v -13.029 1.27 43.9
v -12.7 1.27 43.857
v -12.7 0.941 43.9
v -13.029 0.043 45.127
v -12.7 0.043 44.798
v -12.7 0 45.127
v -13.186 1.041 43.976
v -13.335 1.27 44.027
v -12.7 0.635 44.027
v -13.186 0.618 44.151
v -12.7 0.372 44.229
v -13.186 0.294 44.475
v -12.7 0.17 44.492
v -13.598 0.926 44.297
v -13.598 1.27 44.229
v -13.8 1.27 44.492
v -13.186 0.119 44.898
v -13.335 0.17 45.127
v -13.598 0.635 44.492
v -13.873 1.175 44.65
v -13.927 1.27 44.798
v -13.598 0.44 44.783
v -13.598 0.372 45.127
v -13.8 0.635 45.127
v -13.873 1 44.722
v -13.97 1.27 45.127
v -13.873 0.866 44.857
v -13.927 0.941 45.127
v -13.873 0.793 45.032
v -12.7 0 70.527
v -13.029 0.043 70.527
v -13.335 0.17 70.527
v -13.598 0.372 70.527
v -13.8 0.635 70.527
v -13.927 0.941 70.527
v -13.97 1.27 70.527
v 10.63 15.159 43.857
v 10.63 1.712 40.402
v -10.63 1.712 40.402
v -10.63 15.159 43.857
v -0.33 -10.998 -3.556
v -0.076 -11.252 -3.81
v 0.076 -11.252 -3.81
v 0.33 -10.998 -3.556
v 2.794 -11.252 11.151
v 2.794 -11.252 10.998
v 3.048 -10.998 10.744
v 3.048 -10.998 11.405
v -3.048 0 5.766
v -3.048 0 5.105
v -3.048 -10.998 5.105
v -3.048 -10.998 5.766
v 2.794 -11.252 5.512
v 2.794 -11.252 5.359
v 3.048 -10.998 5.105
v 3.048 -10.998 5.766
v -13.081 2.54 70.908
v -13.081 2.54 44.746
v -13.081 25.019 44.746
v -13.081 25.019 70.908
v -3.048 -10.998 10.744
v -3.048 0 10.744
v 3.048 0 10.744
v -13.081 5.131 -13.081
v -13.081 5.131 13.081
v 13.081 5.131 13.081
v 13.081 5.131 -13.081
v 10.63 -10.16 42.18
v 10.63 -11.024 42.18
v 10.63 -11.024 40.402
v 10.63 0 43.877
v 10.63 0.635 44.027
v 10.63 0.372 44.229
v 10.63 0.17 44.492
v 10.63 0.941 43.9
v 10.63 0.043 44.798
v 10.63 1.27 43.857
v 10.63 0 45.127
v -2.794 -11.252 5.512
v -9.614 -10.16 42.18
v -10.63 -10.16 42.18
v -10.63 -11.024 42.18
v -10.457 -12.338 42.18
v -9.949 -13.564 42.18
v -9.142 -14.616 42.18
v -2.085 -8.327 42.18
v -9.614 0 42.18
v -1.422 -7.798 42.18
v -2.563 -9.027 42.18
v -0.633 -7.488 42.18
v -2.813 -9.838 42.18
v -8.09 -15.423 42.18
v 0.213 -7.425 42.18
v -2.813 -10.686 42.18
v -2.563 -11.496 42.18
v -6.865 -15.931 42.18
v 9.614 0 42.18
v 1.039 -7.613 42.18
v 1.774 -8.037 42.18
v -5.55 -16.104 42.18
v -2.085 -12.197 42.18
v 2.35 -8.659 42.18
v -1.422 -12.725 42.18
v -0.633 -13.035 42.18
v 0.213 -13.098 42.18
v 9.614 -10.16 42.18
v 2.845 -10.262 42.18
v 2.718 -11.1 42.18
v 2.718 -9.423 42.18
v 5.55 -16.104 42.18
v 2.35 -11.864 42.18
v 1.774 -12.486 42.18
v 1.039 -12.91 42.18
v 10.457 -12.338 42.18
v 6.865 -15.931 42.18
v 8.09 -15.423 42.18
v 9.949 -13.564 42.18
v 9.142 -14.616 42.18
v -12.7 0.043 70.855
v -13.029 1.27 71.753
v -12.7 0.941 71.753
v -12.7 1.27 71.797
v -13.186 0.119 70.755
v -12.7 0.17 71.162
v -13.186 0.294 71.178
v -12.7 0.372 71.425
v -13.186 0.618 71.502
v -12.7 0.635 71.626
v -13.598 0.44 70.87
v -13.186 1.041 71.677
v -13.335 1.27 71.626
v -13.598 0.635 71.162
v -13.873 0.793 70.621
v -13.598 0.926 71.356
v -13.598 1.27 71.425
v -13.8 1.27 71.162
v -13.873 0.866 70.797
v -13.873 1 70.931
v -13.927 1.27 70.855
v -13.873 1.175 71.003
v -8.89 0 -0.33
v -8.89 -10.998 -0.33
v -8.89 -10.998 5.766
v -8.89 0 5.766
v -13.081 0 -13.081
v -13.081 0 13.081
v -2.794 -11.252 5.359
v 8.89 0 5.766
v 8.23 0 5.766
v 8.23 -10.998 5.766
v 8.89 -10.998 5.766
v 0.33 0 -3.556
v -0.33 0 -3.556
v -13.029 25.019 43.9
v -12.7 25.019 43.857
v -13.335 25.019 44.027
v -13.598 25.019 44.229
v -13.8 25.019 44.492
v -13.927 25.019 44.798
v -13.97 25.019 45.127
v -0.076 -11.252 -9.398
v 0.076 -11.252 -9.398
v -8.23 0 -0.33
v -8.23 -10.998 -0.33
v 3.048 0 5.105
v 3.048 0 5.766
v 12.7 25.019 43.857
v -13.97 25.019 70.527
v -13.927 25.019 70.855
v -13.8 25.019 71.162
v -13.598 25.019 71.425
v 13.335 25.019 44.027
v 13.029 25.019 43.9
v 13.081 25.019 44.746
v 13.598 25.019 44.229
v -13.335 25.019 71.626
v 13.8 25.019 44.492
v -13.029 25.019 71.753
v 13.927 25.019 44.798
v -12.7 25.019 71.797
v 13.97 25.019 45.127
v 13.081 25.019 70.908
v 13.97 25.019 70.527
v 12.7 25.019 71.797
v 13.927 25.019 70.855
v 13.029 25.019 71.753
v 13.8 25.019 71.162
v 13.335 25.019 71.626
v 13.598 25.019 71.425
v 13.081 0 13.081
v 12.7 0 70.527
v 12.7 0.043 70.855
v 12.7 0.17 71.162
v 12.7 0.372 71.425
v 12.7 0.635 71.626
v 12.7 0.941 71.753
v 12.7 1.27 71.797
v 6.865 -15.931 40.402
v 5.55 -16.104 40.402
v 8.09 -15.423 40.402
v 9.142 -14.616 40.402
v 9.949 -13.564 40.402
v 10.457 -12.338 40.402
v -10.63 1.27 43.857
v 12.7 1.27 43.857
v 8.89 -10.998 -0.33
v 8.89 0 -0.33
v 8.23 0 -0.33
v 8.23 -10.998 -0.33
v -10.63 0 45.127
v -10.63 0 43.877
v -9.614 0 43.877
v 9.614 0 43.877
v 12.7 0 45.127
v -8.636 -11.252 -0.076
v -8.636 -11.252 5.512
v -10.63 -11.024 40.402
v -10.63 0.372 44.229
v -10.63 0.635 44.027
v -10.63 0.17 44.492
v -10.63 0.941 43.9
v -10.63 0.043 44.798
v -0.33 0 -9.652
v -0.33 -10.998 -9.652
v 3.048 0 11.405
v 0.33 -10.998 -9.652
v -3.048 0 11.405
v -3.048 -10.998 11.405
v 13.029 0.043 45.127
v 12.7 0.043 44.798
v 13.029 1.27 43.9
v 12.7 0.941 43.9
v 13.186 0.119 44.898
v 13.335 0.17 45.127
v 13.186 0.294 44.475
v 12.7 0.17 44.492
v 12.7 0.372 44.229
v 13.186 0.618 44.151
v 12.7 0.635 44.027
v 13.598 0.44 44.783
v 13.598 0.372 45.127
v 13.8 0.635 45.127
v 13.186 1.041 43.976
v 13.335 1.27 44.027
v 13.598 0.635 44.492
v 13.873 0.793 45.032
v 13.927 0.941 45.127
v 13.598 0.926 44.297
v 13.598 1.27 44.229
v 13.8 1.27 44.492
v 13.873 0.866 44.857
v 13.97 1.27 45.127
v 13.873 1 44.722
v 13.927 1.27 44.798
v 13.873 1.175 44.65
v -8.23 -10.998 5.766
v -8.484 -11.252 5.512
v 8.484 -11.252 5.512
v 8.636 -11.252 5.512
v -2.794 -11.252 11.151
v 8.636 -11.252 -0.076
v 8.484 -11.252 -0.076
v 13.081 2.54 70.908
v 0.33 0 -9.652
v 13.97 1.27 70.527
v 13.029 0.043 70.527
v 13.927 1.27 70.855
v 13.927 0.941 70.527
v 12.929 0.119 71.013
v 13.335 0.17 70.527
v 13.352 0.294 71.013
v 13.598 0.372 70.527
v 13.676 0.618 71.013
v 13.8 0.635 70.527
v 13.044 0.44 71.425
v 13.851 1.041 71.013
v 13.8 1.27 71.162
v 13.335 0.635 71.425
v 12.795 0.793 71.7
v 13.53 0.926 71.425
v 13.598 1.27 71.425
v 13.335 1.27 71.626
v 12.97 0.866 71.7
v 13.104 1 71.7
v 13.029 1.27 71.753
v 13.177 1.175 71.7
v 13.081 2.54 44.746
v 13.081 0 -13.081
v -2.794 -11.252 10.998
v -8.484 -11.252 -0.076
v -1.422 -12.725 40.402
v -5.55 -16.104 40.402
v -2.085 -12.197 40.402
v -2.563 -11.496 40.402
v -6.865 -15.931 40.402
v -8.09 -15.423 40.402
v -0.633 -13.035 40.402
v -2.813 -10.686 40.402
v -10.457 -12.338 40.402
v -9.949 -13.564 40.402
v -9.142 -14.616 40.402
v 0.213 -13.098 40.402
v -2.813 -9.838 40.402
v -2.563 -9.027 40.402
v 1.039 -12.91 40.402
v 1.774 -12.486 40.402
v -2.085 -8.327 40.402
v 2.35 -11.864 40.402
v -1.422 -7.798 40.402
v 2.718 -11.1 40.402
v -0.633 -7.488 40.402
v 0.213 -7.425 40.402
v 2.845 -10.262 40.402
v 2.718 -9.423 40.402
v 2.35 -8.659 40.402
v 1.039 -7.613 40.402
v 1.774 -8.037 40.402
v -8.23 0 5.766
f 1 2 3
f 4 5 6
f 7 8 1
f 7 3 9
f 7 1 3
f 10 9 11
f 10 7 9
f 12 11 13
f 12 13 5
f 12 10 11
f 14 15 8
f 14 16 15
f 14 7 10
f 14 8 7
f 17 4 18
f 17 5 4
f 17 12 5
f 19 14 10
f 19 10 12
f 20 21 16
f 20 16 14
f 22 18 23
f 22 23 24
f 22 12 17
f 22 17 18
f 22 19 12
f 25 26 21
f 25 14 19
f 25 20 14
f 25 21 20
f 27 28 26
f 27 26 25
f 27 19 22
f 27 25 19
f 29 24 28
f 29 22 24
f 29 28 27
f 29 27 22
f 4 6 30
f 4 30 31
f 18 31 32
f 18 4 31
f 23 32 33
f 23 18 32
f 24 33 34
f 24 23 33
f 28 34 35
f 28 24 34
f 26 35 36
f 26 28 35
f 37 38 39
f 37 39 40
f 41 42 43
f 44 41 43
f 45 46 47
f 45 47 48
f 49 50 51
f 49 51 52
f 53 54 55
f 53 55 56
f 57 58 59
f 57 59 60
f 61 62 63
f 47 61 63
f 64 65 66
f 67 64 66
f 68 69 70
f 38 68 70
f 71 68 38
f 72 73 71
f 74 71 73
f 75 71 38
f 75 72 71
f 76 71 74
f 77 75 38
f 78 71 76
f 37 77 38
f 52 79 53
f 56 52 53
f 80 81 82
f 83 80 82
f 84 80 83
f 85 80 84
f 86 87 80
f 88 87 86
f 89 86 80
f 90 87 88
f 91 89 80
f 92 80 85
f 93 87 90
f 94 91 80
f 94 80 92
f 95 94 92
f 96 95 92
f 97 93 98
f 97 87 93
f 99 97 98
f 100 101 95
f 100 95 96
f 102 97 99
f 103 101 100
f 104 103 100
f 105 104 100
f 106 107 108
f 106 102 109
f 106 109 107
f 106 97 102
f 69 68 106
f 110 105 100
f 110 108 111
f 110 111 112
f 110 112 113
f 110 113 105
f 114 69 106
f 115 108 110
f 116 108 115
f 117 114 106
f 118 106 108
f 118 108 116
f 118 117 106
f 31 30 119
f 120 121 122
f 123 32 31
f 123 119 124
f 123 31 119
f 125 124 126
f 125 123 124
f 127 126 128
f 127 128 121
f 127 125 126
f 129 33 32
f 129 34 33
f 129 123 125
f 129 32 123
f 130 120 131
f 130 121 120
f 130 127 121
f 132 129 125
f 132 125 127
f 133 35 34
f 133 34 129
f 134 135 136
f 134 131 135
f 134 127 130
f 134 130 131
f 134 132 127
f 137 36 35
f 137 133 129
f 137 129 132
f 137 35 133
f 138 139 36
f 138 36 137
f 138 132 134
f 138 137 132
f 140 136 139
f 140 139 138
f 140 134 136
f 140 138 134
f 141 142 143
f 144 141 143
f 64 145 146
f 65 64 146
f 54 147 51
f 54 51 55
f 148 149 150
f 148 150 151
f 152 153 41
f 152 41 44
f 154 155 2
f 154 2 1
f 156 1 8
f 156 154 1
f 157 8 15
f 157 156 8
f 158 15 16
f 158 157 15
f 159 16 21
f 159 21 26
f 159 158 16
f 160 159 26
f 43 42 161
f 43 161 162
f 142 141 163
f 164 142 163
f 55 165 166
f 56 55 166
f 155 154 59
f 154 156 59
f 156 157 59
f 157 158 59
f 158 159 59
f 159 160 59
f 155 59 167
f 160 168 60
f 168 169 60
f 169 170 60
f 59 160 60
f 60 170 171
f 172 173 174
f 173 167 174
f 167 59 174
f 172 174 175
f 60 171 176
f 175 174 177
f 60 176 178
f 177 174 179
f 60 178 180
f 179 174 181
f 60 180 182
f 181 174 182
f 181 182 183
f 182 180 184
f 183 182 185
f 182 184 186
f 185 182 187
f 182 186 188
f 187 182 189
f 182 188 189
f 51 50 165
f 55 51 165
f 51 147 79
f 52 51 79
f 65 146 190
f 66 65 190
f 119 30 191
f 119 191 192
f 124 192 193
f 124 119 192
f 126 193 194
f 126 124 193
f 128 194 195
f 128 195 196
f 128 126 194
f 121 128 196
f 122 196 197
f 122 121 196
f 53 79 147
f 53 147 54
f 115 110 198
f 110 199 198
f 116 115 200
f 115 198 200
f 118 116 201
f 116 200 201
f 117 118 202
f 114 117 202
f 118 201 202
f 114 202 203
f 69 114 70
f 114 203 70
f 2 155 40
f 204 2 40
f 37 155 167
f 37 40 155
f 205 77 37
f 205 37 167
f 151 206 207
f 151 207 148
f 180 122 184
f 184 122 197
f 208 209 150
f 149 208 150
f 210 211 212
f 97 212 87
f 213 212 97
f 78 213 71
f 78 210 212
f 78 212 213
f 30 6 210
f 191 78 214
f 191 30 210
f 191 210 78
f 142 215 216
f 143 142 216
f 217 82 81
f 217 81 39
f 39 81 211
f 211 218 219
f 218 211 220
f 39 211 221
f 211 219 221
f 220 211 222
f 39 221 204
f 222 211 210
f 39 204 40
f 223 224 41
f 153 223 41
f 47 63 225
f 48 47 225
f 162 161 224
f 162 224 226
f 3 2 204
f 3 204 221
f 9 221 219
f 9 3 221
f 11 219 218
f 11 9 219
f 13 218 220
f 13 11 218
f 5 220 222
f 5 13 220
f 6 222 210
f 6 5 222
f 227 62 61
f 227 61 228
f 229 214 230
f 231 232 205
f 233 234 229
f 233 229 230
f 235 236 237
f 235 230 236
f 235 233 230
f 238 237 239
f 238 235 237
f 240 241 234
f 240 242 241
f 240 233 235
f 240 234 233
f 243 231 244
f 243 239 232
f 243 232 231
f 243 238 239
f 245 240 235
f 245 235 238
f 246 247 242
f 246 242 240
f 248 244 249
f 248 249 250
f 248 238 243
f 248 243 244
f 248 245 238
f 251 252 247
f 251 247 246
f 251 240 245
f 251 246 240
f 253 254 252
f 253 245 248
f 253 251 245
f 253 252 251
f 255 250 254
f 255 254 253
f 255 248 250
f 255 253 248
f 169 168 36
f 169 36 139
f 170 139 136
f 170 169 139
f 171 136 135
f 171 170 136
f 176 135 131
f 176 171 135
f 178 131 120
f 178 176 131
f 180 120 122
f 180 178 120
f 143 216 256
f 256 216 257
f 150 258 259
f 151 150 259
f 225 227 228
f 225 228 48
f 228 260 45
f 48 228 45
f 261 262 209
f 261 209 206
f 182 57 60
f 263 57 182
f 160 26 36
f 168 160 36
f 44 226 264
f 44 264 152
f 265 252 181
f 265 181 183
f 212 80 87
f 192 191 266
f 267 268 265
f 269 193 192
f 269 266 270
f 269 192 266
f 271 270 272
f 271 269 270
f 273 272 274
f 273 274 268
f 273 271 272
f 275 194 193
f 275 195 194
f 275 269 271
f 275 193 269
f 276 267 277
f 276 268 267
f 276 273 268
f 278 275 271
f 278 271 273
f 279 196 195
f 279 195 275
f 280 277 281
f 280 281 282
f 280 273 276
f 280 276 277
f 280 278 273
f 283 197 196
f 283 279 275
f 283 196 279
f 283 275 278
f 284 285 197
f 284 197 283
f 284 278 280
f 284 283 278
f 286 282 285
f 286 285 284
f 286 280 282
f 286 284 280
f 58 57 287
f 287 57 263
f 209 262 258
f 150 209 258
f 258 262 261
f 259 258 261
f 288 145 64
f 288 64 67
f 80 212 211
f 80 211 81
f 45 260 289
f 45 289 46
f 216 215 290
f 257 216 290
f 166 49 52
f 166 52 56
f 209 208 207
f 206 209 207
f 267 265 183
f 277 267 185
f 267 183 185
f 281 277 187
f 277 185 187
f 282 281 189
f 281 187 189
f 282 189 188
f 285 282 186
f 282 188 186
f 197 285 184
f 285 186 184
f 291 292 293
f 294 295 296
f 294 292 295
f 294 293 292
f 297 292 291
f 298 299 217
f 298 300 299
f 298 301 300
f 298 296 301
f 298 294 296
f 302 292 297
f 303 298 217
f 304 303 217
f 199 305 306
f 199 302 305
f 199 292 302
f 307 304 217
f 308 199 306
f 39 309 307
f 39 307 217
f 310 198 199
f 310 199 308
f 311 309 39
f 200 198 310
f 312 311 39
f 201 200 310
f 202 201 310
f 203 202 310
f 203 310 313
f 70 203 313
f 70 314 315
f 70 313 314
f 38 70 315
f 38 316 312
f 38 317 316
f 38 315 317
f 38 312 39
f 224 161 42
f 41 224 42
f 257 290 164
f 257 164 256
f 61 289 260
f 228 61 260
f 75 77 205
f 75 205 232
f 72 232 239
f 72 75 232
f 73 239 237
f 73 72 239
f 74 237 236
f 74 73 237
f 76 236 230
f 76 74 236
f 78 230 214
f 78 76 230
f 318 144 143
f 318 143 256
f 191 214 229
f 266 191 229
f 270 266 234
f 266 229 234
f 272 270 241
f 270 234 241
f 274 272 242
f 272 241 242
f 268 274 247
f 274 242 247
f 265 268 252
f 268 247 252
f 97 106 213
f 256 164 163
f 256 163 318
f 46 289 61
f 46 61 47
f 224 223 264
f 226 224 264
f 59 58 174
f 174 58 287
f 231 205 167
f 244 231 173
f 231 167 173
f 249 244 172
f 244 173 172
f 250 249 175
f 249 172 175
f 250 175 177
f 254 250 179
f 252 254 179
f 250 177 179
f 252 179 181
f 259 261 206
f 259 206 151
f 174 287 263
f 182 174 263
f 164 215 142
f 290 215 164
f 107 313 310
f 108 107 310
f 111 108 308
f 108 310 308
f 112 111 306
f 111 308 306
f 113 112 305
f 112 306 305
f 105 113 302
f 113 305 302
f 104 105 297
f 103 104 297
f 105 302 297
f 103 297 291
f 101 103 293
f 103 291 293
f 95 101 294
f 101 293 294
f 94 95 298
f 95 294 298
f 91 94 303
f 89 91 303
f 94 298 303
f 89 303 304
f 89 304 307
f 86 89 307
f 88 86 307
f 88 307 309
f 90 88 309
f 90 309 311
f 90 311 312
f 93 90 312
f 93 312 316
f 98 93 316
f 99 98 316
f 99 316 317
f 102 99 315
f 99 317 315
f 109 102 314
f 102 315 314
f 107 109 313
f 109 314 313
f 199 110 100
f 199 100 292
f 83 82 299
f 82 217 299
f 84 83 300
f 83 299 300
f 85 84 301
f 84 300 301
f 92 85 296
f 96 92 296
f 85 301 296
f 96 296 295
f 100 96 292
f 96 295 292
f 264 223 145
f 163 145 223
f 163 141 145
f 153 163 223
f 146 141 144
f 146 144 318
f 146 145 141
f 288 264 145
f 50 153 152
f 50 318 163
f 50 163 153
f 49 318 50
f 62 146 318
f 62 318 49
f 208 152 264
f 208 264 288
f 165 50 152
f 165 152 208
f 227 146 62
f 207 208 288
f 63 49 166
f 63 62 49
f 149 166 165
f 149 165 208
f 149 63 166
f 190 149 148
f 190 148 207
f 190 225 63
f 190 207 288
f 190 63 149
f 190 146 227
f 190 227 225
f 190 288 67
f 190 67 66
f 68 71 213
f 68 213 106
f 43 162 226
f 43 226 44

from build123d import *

# Parameters (mm, degrees)
F0_W          = 26.162
F0_H          = 26.162
F0_W_2        = 0.6604
F0_H_2        = 6.096
F0_W_3        = 6.096
F0_H_3        = 0.6604
F1_DEPTH      = 5.1308
F2_DEPTH      = 11.2522
F3_SIZE       = 0.254
F4_W          = 27.94
F4_H          = 27.94
F4_W_2        = 26.162
F4_H_2        = 26.162
F5_DEPTH      = 25.019
F6_START      = -2.54
F6_DEPTH      = 25.4
F8_DEPTH      = 10.6299
F9_DEPTH      = 9.6139
F10_R         = 2.8448
F11_DEPTH     = 1.778
F12_R         = 5.08
F13_T1_DEPTH  = 25.4
F13_T3_DEPTH  = 26.924
F13_T5_DEPTH  = 25.4
F13_T7_DEPTH  = 2.0701
F13_T9_DEPTH  = 2.0701
F13_S13_W     = 1.2954
F13_S13_H     = 1.2954
F13_T14_DEPTH = 1.2954
F13_S19_W     = 1.2954
F13_S19_H     = 1.2954
F13_T20_DEPTH = 1.2954
F13_S25_W     = 1.2954
F13_S25_H     = 1.2954
F13_T26_DEPTH = 1.2954
F13_S31_W     = 1.2954
F13_S31_H     = 1.2954
F13_T32_DEPTH = 1.2954


# Not quite as in the source:
# - a fillet or chamfer that OpenCascade refuses, or shapes differently, is made with other operations: its cross-section is extruded or revolved along the edge and cut away or added


with BuildPart() as f1:
    # F0 (on Front) → F1 (new body)
    with BuildSketch(Plane.XZ):
        Rectangle(F0_W, F0_H)
        with Locations((0, -6.604)):
            Rectangle(F0_W_2, F0_H_2, mode=Mode.SUBTRACT)
        with Locations((-8.5598, 2.7178)):
            Rectangle(F0_W_2, F0_H_2, mode=Mode.SUBTRACT)
        with Locations((0, 5.4356)):
            Rectangle(F0_W_3, F0_H_3, mode=Mode.SUBTRACT)
        with Locations((8.5598, 2.7178)):
            Rectangle(F0_W_2, F0_H_2, mode=Mode.SUBTRACT)
        with Locations((0, 11.0744)):
            Rectangle(F0_W_3, F0_H_3, mode=Mode.SUBTRACT)
        with Locations((0, 11.0744)):
            Rectangle(F0_W_3, F0_H_3)
        with Locations((0, 5.4356)):
            Rectangle(F0_W_3, F0_H_3)
        with Locations((-8.5598, 2.7178)):
            Rectangle(F0_W_2, F0_H_2)
        with Locations((8.5598, 2.7178)):
            Rectangle(F0_W_2, F0_H_2)
        with Locations((0, -6.604)):
            Rectangle(F0_W_2, F0_H_2)
    extrude(amount=-F1_DEPTH)

    # F0 (on Front) → F2 (join)
    with BuildSketch(Plane.XZ):
        with Locations((0, 11.0744)):
            Rectangle(F0_W_3, F0_H_3)
        with Locations((0, 5.4356)):
            Rectangle(F0_W_3, F0_H_3)
        with Locations((-8.5598, 2.7178)):
            Rectangle(F0_W_2, F0_H_2)
        with Locations((8.5598, 2.7178)):
            Rectangle(F0_W_2, F0_H_2)
        with Locations((0, -6.604)):
            Rectangle(F0_W_2, F0_H_2)
    extrude(amount=F2_DEPTH)

    # F3
    f3_edges = [f1.edges().sort_by_distance(p)[0] for p in [
        (0, -11.2522, 5.7658),
        (0, -11.2522, 5.1054),
        (-3.048, -11.2522, 5.4356),
        (3.048, -11.2522, 5.4356),
        (0, -11.2522, 11.4046),
        (0, -11.2522, 10.7442),
        (-3.048, -11.2522, 11.0744),
        (3.048, -11.2522, 11.0744),
        (8.5598, -11.2522, 5.7658),
        (8.89, -11.2522, 2.7178),
        (8.2296, -11.2522, 2.7178),
        (8.5598, -11.2522, -0.3302),
        (-8.5598, -11.2522, 5.7658),
        (-8.2296, -11.2522, 2.7178),
        (-8.89, -11.2522, 2.7178),
        (-8.5598, -11.2522, -0.3302),
        (0, -11.2522, -3.556),
        (0.3302, -11.2522, -6.604),
        (-0.3302, -11.2522, -6.604),
        (0, -11.2522, -9.652),
    ]]
    chamfer(f3_edges, length=F3_SIZE)


with BuildPart() as f5:
    # F4 (on Front) → F5 (new body)
    with BuildSketch(Plane.XZ):
        with Locations((0, 57.826566013)):
            Rectangle(F4_W, F4_H)
        with Locations((0, 57.826566013)):
            Rectangle(F4_W_2, F4_H_2, mode=Mode.SUBTRACT)
        with Locations((0, 57.826566013)):
            Rectangle(F4_W_2, F4_H_2)
    extrude(amount=-F5_DEPTH)

    # F4 (on Front) → F6 (cut)
    with BuildSketch(Plane.XZ.offset(F6_START)):
        with Locations((0, 57.826566013)):
            Rectangle(F4_W_2, F4_H_2)
    extrude(amount=-F6_DEPTH, mode=Mode.SUBTRACT)

    # F7 (on Right) → F8 (join, symmetric)
    with BuildSketch(Plane.YZ):
        Polygon((-16.1036, 40.402166013), (1.7117746174, 40.402166013), (15.24, 43.8772775233), (0, 43.8772775233), (0, 42.180166013), (-10.16, 42.180166013), (-16.1036, 42.180166013), align=None)
        Polygon((0, 42.180166013), (0, 43.8772775233), (-10.16, 42.180166013), align=None)
    extrude(amount=F8_DEPTH, both=True)

    # F7 (on Right) → F9 (cut, symmetric)
    with BuildSketch(Plane.YZ):
        Polygon((0, 42.180166013), (0, 43.8772775233), (-10.16, 42.180166013), align=None)
    extrude(amount=F9_DEPTH, both=True, mode=Mode.SUBTRACT)

    # F10 (on face) → F11 (cut, through all)
    with BuildSketch(Plane(origin=(0, 0, 40.402166013), x_dir=(1, 0, 0), z_dir=(0, 0, -1))):
        with Locations((0, 10.2616)):
            Circle(F10_R)
    extrude(amount=-F11_DEPTH, mode=Mode.SUBTRACT)

    # F12
    f12_edges = [f5.edges().sort_by_distance(p)[0] for p in [
        (-10.6299, -16.1036, 41.291166),
        (10.6299, -16.1036, 41.291166),
    ]]
    fillet(f12_edges, radius=F12_R)

    # F13: fillet of radius 1.27 on 9 edges, made by hand

    # F13_s2 → F13_t1 (cut)
    with BuildSketch(Plane.XY.offset(45.126566013)):
        with BuildLine():
            ThreePointArc((12.7, 0), (13.5980256121, 0.3719743879), (13.97, 1.27))
            Line((13.97, 1.27), (13.97, 0))
            Line((13.97, 0), (12.7, 0))
        make_face()
        with BuildLine():
            ThreePointArc((-12.7, 0), (-13.5980256121, 0.3719743879), (-13.97, 1.27))
            Line((-13.97, 1.27), (-13.97, 0))
            Line((-13.97, 0), (-12.7, 0))
        make_face()
    extrude(amount=F13_T1_DEPTH, mode=Mode.SUBTRACT)

    # F13_s4 → F13_t3 (cut)
    with BuildSketch(Plane.XZ.offset(-28.194)):
        with BuildLine():
            ThreePointArc((13.97, 70.526566013), (13.5980256121, 71.4245916251), (12.7, 71.796566013))
            Line((12.7, 71.796566013), (13.97, 71.796566013))
            Line((13.97, 71.796566013), (13.97, 70.526566013))
        make_face()
        with BuildLine():
            ThreePointArc((-13.97, 70.526566013), (-13.5980256121, 71.4245916251), (-12.7, 71.796566013))
            Line((-12.7, 71.796566013), (-13.97, 71.796566013))
            Line((-13.97, 71.796566013), (-13.97, 70.526566013))
        make_face()
        with BuildLine():
            ThreePointArc((-12.7, 43.856566013), (-13.5980256121, 44.2285404009), (-13.97, 45.126566013))
            Line((-13.97, 45.126566013), (-13.97, 43.856566013))
            Line((-13.97, 43.856566013), (-12.7, 43.856566013))
        make_face()
        with BuildLine():
            ThreePointArc((12.7, 43.856566013), (13.5980256121, 44.2285404009), (13.97, 45.126566013))
            Line((13.97, 45.126566013), (13.97, 43.856566013))
            Line((13.97, 43.856566013), (12.7, 43.856566013))
        make_face()
    extrude(amount=F13_T3_DEPTH, mode=Mode.SUBTRACT)

    # F13_s6 → F13_t5 (cut)
    with BuildSketch(Plane.YZ.offset(-12.7)):
        with BuildLine():
            ThreePointArc((0, 70.526566013), (0.3719743879, 71.4245916251), (1.27, 71.796566013))
            Line((1.27, 71.796566013), (0, 71.796566013))
            Line((0, 71.796566013), (0, 70.526566013))
        make_face()
    extrude(amount=F13_T5_DEPTH, mode=Mode.SUBTRACT)

    # F13_s8 → F13_t7 (cut)
    with BuildSketch(Plane.YZ.offset(-12.7)):
        with BuildLine():
            ThreePointArc((1.27, 43.856566013), (0.3719743879, 44.2285404009), (0, 45.126566013))
            Line((0, 45.126566013), (0, 43.856566013))
            Line((0, 43.856566013), (1.27, 43.856566013))
        make_face()
    extrude(amount=F13_T7_DEPTH, mode=Mode.SUBTRACT)

    # F13_s10 → F13_t9 (cut)
    with BuildSketch(Plane.YZ.offset(10.6299)):
        with BuildLine():
            ThreePointArc((1.27, 43.856566013), (0.3719743879, 44.2285404009), (0, 45.126566013))
            Line((0, 45.126566013), (0, 43.856566013))
            Line((0, 43.856566013), (1.27, 43.856566013))
        make_face()
    extrude(amount=F13_T9_DEPTH, mode=Mode.SUBTRACT)


with BuildPart() as f13_tool12:
    # F13_s13 → F13_t14 (new body)
    with BuildSketch(Plane.YZ.offset(12.7)):
        with Locations((0.6223, 44.478866013)):
            Rectangle(F13_S13_W, F13_S13_H)
    extrude(amount=F13_T14_DEPTH)

    # F13_s15 → F13_t16 (revolve, cut)
    with BuildSketch(Plane(origin=(12.7, 1.27, 45.126566013), x_dir=(0, 0.7071067812, 0.7071067812), z_dir=(0, 0.7071067812, -0.7071067812))):
        with BuildLine():
            ThreePointArc((0, -1.27), (1.27, 0), (0, 1.27))
            Line((0, 1.27), (0, -1.27))
        make_face()
    revolve(axis=Axis((12.7, 1.27, 45.126566013), (1, 0, 0)), mode=Mode.SUBTRACT)


with BuildPart() as f5_1:
    add(f5.part)

    # F13_t11: cut F13_tool12
    add(f13_tool12.part, mode=Mode.SUBTRACT)


with BuildPart() as f13_tool18:
    # F13_s19 → F13_t20 (new body)
    with BuildSketch(Plane.XY.offset(70.526566013)):
        with Locations((13.3477, 0.6223)):
            Rectangle(F13_S19_W, F13_S19_H)
    extrude(amount=F13_T20_DEPTH)

    # F13_s21 → F13_t22 (revolve, cut)
    with BuildSketch(Plane(origin=(12.7, 1.27, 70.526566013), x_dir=(-0.7071067812, 0.7071067812, 0), z_dir=(0.7071067812, 0.7071067812, 0))):
        with BuildLine():
            ThreePointArc((0, -1.27), (1.27, 0), (0, 1.27))
            Line((0, 1.27), (0, -1.27))
        make_face()
    revolve(axis=Axis((12.7, 1.27, 70.526566013), (0, 0, 1)), mode=Mode.SUBTRACT)


with BuildPart() as f5_2:
    add(f5_1.part)

    # F13_t17: cut F13_tool18
    add(f13_tool18.part, mode=Mode.SUBTRACT)


with BuildPart() as f13_tool24:
    # F13_s25 → F13_t26 (new body)
    with BuildSketch(Plane.YZ.offset(-12.7)):
        with Locations((0.6223, 71.174266013)):
            Rectangle(F13_S25_W, F13_S25_H)
    extrude(amount=-F13_T26_DEPTH)

    # F13_s27 → F13_t28 (revolve, cut)
    with BuildSketch(Plane(origin=(-12.7, 1.27, 70.526566013), x_dir=(0, 0.7071067812, -0.7071067812), z_dir=(0, 0.7071067812, 0.7071067812))):
        with BuildLine():
            ThreePointArc((0, -1.27), (1.27, 0), (0, 1.27))
            Line((0, 1.27), (0, -1.27))
        make_face()
    revolve(axis=Axis((-12.7, 1.27, 70.526566013), (-1, 0, 0)), mode=Mode.SUBTRACT)


with BuildPart() as f5_3:
    add(f5_2.part)

    # F13_t23: cut F13_tool24
    add(f13_tool24.part, mode=Mode.SUBTRACT)


with BuildPart() as f13_tool30:
    # F13_s31 → F13_t32 (new body)
    with BuildSketch(Plane.YZ.offset(-12.7)):
        with Locations((0.6223, 44.478866013)):
            Rectangle(F13_S31_W, F13_S31_H)
    extrude(amount=-F13_T32_DEPTH)

    # F13_s33 → F13_t34 (revolve, cut)
    with BuildSketch(Plane(origin=(-12.7, 1.27, 45.126566013), x_dir=(0, 0.7071067812, 0.7071067812), z_dir=(0, -0.7071067812, 0.7071067812))):
        with BuildLine():
            ThreePointArc((0, -1.27), (1.27, 0), (0, 1.27))
            Line((0, 1.27), (0, -1.27))
        make_face()
    revolve(axis=Axis((-12.7, 1.27, 45.126566013), (-1, 0, 0)), mode=Mode.SUBTRACT)


with BuildPart() as f5_4:
    add(f5_3.part)

    # F13_t29: cut F13_tool30
    add(f13_tool30.part, mode=Mode.SUBTRACT)


solid = Compound([f1.part, f5_4.part])
